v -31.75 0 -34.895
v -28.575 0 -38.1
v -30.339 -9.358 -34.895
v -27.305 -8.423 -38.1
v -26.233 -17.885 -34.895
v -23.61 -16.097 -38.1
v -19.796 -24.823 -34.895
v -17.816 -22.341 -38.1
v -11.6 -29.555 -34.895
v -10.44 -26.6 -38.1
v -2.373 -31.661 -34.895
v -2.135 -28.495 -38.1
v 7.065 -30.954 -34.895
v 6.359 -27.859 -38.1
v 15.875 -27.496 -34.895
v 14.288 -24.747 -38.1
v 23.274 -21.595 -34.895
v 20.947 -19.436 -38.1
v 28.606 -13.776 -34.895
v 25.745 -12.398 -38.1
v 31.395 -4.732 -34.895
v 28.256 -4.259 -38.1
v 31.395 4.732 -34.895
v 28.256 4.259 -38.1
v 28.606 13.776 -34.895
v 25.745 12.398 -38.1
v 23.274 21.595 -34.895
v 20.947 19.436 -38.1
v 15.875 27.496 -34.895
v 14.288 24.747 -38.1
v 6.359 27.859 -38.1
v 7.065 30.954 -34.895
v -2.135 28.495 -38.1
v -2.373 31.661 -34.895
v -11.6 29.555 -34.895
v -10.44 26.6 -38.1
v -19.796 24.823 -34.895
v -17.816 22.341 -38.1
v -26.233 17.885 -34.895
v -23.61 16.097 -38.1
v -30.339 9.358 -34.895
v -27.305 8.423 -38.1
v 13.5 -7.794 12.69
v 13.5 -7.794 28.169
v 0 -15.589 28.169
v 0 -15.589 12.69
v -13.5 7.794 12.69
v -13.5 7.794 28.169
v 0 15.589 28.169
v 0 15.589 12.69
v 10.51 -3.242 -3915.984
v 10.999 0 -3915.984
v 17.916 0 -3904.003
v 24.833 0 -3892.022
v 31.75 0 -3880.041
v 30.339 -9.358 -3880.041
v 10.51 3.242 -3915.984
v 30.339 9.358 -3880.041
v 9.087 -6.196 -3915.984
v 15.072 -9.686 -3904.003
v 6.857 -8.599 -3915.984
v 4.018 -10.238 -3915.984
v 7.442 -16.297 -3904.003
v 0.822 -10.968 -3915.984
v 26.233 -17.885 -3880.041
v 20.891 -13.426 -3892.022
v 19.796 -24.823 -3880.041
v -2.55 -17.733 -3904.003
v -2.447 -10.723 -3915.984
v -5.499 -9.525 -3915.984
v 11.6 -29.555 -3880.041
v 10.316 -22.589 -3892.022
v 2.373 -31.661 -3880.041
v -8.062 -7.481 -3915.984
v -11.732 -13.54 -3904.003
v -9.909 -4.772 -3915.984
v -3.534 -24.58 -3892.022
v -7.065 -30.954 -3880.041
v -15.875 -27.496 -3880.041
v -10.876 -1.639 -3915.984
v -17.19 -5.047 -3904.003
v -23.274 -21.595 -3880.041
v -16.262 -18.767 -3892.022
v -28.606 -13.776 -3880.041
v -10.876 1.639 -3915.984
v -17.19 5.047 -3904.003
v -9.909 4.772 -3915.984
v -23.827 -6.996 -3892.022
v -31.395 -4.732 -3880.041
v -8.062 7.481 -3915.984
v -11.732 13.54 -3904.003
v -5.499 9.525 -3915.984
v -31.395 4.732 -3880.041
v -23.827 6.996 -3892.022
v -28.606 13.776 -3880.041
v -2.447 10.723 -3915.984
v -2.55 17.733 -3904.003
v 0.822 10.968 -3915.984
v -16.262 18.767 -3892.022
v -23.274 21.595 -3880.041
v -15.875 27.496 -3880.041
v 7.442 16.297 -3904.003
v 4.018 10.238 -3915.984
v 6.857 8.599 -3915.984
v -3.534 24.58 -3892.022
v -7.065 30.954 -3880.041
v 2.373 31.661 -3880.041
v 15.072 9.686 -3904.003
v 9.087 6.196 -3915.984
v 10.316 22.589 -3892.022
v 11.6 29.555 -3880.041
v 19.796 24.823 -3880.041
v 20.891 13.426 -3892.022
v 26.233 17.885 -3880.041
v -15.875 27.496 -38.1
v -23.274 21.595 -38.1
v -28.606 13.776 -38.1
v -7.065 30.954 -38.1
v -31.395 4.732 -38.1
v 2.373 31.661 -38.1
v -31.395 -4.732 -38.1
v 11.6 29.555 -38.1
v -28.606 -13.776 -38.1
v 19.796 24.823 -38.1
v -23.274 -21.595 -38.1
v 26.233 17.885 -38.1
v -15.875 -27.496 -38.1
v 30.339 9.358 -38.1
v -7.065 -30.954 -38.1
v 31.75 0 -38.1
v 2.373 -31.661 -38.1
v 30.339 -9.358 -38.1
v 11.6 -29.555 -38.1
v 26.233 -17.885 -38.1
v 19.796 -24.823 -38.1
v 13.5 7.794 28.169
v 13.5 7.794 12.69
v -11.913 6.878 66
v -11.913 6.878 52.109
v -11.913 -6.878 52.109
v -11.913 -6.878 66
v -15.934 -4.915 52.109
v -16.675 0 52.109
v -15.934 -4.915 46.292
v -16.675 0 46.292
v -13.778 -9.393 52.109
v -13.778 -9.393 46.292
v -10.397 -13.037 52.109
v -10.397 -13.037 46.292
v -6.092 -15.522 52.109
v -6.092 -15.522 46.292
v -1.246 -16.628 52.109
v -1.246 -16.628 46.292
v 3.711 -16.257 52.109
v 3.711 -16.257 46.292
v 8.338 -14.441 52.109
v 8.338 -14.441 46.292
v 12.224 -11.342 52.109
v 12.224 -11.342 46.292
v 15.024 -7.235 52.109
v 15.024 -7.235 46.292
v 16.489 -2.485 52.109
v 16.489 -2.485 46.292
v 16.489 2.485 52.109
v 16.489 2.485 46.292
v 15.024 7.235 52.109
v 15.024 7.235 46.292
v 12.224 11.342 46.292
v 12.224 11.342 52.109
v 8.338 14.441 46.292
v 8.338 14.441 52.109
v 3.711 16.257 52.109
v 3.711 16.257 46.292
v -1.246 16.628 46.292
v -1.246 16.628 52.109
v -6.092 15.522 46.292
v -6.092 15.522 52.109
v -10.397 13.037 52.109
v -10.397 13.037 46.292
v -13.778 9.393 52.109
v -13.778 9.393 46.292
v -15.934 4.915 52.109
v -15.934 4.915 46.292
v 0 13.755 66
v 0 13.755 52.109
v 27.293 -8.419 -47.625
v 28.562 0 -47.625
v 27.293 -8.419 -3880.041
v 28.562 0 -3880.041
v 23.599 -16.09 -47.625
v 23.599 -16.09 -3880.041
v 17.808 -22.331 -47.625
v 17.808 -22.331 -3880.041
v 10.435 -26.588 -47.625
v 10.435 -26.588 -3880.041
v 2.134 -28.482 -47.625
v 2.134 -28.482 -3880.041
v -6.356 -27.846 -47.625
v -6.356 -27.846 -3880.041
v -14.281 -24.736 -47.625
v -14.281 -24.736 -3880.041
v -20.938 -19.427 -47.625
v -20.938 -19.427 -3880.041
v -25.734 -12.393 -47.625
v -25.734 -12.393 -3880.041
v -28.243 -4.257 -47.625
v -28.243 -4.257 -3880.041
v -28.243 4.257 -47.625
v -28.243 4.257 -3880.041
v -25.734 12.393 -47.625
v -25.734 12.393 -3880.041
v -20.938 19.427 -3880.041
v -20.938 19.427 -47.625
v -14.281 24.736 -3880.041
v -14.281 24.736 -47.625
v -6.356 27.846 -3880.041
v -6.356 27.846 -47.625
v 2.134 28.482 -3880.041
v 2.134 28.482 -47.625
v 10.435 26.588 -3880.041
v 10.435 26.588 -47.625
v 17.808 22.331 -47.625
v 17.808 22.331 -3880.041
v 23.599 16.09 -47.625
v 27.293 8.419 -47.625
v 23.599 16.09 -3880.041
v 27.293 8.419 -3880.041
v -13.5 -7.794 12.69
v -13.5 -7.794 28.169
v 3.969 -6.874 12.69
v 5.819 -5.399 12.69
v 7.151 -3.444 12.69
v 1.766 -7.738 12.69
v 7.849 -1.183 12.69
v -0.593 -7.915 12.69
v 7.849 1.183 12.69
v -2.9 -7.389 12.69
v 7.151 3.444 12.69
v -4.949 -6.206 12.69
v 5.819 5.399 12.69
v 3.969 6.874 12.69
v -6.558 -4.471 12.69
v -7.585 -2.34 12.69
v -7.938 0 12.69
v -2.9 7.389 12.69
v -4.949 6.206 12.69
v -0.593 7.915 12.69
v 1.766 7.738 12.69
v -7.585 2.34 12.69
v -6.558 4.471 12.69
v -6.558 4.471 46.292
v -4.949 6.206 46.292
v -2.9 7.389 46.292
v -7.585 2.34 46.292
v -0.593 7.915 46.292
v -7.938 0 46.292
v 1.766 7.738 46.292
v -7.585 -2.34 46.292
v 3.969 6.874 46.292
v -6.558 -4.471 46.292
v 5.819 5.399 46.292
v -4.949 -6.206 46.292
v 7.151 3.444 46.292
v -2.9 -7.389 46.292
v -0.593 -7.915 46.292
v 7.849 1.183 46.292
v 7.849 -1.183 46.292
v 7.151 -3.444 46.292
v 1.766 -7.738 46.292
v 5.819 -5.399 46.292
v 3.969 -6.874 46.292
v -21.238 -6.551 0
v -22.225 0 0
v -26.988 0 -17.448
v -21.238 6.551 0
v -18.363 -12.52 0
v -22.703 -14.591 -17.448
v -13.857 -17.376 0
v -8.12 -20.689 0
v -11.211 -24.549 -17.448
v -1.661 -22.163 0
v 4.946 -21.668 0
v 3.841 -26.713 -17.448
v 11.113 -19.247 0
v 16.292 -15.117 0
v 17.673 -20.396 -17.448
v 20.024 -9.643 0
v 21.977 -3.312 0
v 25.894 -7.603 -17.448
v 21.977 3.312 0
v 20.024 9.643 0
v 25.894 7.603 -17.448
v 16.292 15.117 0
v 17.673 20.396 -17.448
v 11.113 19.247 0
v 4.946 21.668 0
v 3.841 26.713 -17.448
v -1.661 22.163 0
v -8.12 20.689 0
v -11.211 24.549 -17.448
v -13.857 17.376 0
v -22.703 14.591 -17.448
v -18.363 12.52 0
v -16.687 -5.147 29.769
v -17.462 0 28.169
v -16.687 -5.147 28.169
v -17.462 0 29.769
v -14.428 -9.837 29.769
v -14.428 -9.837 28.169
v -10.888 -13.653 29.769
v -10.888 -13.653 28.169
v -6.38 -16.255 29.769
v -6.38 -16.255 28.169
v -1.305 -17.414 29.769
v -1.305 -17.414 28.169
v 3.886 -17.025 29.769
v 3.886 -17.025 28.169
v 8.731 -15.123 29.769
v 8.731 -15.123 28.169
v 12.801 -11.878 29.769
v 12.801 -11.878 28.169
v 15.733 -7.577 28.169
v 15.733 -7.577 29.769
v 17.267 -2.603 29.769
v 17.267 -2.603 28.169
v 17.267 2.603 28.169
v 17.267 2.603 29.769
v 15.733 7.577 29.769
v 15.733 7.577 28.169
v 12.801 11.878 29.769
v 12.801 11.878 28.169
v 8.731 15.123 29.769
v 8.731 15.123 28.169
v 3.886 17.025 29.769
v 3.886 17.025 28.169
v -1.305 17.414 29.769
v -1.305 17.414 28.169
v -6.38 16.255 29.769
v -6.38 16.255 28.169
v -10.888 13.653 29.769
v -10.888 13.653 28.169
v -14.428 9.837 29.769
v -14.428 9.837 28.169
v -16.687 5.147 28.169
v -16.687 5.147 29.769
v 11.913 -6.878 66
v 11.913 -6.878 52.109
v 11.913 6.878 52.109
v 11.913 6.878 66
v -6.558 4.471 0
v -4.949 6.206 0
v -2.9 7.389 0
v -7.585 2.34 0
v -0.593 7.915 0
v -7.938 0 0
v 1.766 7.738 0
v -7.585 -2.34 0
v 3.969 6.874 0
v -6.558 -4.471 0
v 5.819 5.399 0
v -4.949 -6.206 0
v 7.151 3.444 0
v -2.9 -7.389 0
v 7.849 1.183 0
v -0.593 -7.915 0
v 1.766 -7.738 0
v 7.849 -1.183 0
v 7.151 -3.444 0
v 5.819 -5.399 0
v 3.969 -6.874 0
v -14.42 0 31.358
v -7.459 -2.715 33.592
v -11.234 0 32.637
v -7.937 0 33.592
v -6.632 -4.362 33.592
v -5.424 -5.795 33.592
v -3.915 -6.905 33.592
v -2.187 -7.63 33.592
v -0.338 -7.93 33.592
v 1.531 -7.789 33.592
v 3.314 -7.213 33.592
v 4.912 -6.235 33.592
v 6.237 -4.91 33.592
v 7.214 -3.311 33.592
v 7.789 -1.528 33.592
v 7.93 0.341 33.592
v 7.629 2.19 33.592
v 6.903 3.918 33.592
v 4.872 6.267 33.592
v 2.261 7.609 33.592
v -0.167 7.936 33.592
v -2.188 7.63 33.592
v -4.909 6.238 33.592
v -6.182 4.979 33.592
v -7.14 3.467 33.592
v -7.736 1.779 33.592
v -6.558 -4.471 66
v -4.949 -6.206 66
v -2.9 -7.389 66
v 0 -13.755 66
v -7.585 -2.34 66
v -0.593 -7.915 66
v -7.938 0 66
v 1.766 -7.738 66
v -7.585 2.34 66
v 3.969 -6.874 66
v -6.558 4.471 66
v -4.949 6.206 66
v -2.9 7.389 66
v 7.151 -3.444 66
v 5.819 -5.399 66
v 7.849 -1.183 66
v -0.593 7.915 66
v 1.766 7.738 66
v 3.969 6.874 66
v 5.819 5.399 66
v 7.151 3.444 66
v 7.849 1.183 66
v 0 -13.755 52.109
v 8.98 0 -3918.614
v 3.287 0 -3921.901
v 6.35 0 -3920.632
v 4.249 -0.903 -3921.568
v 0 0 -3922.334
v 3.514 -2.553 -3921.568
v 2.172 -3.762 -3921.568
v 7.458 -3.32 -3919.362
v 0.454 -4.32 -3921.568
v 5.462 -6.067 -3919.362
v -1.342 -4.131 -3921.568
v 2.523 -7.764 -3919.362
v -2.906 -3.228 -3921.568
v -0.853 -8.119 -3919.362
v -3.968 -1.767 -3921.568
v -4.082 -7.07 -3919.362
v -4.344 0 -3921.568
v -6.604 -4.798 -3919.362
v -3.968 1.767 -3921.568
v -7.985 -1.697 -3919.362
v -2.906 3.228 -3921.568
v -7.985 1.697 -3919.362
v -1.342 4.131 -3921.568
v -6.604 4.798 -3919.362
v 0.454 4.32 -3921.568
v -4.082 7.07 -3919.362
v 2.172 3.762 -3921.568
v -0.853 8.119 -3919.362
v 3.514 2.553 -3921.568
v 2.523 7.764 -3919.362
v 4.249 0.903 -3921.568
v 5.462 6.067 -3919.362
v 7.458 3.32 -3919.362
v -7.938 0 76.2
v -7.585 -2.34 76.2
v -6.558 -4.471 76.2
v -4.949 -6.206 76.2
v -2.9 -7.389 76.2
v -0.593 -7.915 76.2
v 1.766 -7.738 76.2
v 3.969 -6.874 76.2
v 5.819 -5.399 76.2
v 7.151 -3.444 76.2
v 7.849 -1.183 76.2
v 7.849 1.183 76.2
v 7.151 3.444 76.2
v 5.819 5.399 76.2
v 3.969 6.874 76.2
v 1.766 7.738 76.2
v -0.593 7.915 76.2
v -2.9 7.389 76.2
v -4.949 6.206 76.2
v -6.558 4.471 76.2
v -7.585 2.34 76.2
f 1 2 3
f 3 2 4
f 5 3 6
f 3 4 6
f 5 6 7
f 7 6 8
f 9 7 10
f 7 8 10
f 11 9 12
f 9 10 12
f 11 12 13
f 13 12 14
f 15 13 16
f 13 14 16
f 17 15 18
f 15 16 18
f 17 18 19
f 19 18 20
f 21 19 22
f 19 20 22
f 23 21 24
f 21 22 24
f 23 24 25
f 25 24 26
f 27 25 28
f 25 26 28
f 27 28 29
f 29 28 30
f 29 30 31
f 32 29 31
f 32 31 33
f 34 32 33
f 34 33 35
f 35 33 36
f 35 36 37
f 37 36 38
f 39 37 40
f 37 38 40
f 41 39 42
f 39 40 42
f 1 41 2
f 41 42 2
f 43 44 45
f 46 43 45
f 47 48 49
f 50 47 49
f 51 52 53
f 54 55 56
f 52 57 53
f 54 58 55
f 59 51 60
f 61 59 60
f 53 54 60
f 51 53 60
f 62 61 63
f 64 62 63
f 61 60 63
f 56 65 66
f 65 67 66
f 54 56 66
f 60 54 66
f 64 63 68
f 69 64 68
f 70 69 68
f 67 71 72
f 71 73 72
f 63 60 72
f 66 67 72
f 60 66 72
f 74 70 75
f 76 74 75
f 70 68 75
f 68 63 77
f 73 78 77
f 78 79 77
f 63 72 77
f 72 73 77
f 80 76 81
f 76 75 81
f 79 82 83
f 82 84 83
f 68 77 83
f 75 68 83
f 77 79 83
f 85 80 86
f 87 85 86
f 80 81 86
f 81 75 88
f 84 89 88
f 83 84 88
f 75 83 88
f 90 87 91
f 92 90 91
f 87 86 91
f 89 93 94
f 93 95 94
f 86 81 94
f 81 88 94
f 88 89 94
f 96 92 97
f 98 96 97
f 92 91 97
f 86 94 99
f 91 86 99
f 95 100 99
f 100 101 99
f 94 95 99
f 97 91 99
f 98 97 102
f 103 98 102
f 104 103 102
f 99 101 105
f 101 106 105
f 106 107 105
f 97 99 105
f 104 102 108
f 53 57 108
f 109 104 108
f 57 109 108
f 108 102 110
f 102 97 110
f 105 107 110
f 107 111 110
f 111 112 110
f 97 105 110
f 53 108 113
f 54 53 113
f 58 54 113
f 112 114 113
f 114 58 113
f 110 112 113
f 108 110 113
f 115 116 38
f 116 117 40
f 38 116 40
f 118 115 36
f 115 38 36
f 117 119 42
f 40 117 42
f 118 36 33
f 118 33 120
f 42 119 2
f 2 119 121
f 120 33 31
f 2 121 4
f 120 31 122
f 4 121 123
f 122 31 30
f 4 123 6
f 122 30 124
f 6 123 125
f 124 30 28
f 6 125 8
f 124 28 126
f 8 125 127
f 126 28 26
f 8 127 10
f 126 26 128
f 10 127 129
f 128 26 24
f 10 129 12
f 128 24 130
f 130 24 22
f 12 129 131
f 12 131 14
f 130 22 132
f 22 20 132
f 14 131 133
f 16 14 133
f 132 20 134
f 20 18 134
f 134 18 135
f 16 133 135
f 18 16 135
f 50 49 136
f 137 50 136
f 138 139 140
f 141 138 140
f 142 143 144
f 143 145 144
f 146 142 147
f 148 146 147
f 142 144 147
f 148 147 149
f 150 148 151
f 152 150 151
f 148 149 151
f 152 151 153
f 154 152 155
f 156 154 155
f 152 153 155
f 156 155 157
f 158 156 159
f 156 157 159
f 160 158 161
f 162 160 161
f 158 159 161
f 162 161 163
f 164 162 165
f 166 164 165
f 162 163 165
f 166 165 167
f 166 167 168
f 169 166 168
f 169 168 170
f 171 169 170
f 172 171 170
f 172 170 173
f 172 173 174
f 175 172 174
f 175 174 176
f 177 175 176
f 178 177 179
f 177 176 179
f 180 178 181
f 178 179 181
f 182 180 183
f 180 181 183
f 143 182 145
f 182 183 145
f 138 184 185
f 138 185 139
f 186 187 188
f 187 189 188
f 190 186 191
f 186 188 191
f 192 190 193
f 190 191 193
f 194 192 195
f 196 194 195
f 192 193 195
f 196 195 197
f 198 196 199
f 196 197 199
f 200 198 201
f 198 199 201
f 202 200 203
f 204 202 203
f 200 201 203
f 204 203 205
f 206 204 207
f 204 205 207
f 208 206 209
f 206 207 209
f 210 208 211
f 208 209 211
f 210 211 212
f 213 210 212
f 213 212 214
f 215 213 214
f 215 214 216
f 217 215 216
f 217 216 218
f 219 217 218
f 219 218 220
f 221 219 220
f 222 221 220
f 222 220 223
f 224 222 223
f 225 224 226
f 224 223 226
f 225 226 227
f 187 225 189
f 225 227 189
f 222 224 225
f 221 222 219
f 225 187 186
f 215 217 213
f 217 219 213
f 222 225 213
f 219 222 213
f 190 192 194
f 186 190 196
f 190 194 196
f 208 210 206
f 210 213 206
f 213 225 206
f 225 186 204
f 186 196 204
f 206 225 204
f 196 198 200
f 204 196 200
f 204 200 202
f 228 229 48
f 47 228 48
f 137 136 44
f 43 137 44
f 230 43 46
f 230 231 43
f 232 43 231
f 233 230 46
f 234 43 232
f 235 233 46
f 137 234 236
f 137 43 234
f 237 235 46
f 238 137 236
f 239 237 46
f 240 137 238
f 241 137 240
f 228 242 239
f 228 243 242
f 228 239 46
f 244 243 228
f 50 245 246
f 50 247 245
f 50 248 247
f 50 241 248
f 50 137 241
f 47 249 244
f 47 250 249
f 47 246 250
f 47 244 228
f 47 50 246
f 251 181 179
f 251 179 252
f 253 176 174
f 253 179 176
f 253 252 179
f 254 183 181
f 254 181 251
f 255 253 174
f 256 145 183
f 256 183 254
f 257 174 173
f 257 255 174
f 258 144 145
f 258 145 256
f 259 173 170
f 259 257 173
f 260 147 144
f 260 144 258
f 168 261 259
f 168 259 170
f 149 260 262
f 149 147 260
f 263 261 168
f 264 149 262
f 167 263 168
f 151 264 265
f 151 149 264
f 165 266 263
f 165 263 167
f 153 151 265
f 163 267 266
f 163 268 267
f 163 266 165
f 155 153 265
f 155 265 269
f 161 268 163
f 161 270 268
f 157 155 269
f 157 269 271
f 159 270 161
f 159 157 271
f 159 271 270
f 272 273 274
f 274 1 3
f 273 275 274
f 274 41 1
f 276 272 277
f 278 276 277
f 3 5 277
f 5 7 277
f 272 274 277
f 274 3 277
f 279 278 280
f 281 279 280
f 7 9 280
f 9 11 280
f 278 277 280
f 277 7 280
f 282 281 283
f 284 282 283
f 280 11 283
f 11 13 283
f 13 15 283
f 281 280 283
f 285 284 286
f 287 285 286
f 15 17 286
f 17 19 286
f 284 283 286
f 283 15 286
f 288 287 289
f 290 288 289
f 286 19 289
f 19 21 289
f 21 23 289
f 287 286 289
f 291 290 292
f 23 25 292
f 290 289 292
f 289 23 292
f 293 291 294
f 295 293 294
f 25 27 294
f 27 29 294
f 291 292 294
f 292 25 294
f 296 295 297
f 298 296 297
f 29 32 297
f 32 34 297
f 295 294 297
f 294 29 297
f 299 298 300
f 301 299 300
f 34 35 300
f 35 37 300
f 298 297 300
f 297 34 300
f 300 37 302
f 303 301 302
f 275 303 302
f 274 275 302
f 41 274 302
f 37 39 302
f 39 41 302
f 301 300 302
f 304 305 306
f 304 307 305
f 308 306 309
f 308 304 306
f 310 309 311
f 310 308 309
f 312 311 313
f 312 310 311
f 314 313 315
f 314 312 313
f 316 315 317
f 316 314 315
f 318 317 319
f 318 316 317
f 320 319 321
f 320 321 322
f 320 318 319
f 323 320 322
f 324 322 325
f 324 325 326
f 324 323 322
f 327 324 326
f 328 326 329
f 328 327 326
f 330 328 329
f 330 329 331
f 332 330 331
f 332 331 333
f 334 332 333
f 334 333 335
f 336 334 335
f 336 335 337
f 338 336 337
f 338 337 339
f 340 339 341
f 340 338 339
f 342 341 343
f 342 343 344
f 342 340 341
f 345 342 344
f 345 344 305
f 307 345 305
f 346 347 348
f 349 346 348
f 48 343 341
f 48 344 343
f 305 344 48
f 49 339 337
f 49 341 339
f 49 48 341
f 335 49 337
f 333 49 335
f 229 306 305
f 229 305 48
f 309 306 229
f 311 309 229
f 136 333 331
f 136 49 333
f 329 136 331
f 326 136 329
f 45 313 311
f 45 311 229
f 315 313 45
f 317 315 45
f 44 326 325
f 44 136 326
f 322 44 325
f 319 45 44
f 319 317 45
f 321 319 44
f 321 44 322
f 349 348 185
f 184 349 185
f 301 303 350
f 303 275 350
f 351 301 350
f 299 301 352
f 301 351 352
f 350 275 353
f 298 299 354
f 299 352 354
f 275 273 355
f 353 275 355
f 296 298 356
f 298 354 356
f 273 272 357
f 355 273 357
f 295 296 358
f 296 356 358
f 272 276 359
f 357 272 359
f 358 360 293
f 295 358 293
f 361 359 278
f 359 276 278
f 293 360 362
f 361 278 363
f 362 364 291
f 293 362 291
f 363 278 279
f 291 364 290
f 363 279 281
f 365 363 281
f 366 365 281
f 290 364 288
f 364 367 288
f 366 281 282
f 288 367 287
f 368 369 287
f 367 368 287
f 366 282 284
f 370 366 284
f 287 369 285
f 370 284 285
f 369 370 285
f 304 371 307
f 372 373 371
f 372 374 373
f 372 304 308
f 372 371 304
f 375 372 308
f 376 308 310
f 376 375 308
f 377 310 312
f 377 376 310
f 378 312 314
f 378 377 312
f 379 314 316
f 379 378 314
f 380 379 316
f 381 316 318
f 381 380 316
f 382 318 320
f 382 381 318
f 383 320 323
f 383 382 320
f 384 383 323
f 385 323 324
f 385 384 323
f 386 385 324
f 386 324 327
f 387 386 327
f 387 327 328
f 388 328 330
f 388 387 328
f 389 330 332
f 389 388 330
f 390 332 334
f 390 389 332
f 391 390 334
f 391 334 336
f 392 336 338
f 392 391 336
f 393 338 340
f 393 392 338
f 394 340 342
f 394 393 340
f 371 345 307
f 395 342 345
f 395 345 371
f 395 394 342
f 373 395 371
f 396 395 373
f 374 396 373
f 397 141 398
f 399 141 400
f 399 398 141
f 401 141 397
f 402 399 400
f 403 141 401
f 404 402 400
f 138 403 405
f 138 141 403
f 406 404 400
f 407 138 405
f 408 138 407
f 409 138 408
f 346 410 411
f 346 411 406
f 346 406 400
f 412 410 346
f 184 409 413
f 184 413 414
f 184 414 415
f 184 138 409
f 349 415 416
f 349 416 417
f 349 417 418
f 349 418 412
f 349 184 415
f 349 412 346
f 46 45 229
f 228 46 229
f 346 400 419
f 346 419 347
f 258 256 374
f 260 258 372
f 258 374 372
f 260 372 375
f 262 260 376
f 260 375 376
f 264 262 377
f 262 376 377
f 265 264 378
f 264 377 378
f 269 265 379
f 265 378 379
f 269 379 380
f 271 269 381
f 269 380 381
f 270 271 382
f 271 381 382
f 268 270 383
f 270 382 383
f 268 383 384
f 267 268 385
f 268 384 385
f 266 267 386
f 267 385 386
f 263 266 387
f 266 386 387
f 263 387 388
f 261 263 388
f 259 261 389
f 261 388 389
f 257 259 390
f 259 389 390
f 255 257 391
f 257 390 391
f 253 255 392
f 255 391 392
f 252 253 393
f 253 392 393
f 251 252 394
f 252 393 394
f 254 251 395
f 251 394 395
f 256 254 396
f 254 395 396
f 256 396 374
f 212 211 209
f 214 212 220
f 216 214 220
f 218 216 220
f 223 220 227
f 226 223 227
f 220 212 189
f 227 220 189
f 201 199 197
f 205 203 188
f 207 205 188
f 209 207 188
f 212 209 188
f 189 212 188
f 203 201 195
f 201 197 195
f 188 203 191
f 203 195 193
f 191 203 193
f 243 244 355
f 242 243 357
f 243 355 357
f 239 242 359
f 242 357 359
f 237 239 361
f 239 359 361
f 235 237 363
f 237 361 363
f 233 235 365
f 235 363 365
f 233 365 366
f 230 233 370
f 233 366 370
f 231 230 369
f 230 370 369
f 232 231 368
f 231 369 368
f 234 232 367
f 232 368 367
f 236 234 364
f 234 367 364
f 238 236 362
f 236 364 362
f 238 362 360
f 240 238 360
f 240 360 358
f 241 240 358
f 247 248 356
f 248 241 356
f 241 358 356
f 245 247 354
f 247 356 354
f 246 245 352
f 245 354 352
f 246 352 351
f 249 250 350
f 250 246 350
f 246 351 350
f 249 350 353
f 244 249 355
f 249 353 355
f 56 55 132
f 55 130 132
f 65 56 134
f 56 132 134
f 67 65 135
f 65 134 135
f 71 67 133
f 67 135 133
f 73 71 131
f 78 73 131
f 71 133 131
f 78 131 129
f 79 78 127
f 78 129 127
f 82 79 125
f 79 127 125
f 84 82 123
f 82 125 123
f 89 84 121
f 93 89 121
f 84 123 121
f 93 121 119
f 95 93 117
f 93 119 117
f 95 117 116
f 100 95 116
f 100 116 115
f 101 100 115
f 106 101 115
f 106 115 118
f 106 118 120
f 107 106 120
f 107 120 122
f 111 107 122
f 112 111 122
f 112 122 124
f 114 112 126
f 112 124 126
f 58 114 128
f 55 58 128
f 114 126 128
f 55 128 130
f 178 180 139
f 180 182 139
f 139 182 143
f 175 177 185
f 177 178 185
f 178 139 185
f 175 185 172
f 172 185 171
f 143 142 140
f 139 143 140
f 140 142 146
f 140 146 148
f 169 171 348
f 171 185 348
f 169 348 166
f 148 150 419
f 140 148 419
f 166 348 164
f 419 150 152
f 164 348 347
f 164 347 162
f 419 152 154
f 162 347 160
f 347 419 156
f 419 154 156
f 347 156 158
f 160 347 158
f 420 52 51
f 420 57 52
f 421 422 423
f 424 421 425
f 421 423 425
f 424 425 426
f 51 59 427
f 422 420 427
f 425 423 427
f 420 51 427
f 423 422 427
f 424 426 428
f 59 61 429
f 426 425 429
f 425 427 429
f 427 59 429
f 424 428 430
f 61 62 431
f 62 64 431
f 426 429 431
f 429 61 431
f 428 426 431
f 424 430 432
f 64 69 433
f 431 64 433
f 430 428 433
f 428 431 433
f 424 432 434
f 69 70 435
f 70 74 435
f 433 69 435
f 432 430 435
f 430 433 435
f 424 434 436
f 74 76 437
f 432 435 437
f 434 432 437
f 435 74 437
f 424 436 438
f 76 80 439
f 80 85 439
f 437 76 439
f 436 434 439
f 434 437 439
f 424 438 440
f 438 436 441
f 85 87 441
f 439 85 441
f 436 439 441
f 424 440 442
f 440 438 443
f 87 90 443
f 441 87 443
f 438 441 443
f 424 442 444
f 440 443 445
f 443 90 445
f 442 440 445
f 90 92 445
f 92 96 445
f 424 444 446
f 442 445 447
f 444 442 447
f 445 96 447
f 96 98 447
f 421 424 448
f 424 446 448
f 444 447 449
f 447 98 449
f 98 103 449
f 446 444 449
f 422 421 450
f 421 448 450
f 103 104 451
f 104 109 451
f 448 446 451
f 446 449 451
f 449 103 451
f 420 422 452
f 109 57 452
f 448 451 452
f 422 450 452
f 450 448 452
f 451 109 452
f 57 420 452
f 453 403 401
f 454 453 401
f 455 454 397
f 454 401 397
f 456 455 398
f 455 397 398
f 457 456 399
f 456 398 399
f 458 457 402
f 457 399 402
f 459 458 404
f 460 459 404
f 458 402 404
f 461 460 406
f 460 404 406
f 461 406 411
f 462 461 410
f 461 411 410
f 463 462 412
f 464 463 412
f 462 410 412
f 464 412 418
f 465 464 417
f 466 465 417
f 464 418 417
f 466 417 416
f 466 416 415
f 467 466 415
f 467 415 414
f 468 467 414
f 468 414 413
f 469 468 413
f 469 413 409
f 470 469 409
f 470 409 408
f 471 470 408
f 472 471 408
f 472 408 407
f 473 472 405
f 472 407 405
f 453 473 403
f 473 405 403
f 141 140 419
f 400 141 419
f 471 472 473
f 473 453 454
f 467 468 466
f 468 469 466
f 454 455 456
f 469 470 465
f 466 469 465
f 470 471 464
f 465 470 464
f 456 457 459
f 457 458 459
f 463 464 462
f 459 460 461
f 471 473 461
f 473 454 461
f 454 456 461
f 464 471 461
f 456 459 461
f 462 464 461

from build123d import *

# Parameters (mm, degrees)
BOSS_EXTRUDE1_DEPTH = 15.478125
SKETCH5_W           = 5.8166
SKETCH5_H           = 16.6751
BOSS_EXTRUDE2_DEPTH = 13.890625


with BuildPart() as part:
    # Sketch1 → Base-Revolve (revolve)
    with BuildSketch(Plane(origin=(0, 0, 0), x_dir=(0, 0, -1), z_dir=(1, 0, 0))):
        Polygon((-76.2, 0), (-76.2, 7.9375), (0, 7.9375), (0, 22.225), (34.895210283, 31.75), (38.1, 28.575), (47.625, 28.575), (47.625, 0), align=None)
    revolve(axis=Axis((0, 0, 0), (0, 0, 1)))

    # Sketch3 → Boss-Revolve2 (revolve)
    with BuildSketch(Plane(origin=(0, 0, 0), x_dir=(0, 0, -1), z_dir=(1, 0, 0))):
        with BuildLine():
            Line((-28.1686, 0), (-28.1686, 17.4625))
            Line((-28.1686, 17.4625), (-29.7688, 17.4625))
            ThreePointArc((-29.7688, 17.4625), (-33.309963658, 9.048473715), (-34.5186, 0))
            Line((-34.5186, 0), (-28.1686, 0))
        make_face()
    revolve(axis=Axis((0, 0, 0), (0, 0, 1)))

    # Sketch2 → Boss-Revolve1 (revolve)
    with BuildSketch(Plane(origin=(0, 0, 0), x_dir=(0, 0, -1), z_dir=(1, 0, 0))):
        with BuildLine():
            Line((38.1, 31.75), (38.1, 28.5623))
            Line((38.1, 28.5623), (3880.040929955, 28.5623))
            Line((3880.040929955, 28.5623), (3880.040929955, 0))
            Line((3880.040929955, 0), (3922.333543095, 0))
            ThreePointArc((3922.333543095, 0), (3920.632065723, 6.35), (3915.983543095, 10.998522628))
            Line((3915.983543095, 10.998522628), (3880.040929955, 31.75))
            Line((3880.040929955, 31.75), (38.1, 31.75))
        make_face()
    revolve(axis=Axis((0, 0, 29.7434), (0, 0, -1)))

    # Sketch4 → Boss-Extrude1 (add)
    with BuildSketch(Plane(origin=(0, 0, 28.1686), x_dir=(-1, 0, 0), z_dir=(0, 0, -1))):
        Polygon((0, -15.588572738), (13.5001, -7.794286369), (13.5001, 7.794286369), (0, 15.588572738), (-13.5001, 7.794286369), (-13.5001, -7.794286369), align=None)
    extrude(amount=BOSS_EXTRUDE1_DEPTH)

    # Sketch5 → Boss-Revolve3 (revolve)
    with BuildSketch(Plane(origin=(0, 0, 0), x_dir=(0, 0, -1), z_dir=(1, 0, 0))):
        with Locations((-49.200698399, 8.33755)):
            Rectangle(SKETCH5_W, SKETCH5_H)
    revolve(axis=Axis((0, 0, 0), (0, 0, 1)))

    # Sketch6 → Boss-Extrude2 (add)
    with BuildSketch(Plane.XY.offset(52.108998399)):
        Polygon((0, -13.755485633), (11.9126, -6.877742817), (11.9126, 6.877742817), (0, 13.755485633), (-11.9126, 6.877742817), (-11.9126, -6.877742817), align=None)
    extrude(amount=BOSS_EXTRUDE2_DEPTH)


solid = part.part
